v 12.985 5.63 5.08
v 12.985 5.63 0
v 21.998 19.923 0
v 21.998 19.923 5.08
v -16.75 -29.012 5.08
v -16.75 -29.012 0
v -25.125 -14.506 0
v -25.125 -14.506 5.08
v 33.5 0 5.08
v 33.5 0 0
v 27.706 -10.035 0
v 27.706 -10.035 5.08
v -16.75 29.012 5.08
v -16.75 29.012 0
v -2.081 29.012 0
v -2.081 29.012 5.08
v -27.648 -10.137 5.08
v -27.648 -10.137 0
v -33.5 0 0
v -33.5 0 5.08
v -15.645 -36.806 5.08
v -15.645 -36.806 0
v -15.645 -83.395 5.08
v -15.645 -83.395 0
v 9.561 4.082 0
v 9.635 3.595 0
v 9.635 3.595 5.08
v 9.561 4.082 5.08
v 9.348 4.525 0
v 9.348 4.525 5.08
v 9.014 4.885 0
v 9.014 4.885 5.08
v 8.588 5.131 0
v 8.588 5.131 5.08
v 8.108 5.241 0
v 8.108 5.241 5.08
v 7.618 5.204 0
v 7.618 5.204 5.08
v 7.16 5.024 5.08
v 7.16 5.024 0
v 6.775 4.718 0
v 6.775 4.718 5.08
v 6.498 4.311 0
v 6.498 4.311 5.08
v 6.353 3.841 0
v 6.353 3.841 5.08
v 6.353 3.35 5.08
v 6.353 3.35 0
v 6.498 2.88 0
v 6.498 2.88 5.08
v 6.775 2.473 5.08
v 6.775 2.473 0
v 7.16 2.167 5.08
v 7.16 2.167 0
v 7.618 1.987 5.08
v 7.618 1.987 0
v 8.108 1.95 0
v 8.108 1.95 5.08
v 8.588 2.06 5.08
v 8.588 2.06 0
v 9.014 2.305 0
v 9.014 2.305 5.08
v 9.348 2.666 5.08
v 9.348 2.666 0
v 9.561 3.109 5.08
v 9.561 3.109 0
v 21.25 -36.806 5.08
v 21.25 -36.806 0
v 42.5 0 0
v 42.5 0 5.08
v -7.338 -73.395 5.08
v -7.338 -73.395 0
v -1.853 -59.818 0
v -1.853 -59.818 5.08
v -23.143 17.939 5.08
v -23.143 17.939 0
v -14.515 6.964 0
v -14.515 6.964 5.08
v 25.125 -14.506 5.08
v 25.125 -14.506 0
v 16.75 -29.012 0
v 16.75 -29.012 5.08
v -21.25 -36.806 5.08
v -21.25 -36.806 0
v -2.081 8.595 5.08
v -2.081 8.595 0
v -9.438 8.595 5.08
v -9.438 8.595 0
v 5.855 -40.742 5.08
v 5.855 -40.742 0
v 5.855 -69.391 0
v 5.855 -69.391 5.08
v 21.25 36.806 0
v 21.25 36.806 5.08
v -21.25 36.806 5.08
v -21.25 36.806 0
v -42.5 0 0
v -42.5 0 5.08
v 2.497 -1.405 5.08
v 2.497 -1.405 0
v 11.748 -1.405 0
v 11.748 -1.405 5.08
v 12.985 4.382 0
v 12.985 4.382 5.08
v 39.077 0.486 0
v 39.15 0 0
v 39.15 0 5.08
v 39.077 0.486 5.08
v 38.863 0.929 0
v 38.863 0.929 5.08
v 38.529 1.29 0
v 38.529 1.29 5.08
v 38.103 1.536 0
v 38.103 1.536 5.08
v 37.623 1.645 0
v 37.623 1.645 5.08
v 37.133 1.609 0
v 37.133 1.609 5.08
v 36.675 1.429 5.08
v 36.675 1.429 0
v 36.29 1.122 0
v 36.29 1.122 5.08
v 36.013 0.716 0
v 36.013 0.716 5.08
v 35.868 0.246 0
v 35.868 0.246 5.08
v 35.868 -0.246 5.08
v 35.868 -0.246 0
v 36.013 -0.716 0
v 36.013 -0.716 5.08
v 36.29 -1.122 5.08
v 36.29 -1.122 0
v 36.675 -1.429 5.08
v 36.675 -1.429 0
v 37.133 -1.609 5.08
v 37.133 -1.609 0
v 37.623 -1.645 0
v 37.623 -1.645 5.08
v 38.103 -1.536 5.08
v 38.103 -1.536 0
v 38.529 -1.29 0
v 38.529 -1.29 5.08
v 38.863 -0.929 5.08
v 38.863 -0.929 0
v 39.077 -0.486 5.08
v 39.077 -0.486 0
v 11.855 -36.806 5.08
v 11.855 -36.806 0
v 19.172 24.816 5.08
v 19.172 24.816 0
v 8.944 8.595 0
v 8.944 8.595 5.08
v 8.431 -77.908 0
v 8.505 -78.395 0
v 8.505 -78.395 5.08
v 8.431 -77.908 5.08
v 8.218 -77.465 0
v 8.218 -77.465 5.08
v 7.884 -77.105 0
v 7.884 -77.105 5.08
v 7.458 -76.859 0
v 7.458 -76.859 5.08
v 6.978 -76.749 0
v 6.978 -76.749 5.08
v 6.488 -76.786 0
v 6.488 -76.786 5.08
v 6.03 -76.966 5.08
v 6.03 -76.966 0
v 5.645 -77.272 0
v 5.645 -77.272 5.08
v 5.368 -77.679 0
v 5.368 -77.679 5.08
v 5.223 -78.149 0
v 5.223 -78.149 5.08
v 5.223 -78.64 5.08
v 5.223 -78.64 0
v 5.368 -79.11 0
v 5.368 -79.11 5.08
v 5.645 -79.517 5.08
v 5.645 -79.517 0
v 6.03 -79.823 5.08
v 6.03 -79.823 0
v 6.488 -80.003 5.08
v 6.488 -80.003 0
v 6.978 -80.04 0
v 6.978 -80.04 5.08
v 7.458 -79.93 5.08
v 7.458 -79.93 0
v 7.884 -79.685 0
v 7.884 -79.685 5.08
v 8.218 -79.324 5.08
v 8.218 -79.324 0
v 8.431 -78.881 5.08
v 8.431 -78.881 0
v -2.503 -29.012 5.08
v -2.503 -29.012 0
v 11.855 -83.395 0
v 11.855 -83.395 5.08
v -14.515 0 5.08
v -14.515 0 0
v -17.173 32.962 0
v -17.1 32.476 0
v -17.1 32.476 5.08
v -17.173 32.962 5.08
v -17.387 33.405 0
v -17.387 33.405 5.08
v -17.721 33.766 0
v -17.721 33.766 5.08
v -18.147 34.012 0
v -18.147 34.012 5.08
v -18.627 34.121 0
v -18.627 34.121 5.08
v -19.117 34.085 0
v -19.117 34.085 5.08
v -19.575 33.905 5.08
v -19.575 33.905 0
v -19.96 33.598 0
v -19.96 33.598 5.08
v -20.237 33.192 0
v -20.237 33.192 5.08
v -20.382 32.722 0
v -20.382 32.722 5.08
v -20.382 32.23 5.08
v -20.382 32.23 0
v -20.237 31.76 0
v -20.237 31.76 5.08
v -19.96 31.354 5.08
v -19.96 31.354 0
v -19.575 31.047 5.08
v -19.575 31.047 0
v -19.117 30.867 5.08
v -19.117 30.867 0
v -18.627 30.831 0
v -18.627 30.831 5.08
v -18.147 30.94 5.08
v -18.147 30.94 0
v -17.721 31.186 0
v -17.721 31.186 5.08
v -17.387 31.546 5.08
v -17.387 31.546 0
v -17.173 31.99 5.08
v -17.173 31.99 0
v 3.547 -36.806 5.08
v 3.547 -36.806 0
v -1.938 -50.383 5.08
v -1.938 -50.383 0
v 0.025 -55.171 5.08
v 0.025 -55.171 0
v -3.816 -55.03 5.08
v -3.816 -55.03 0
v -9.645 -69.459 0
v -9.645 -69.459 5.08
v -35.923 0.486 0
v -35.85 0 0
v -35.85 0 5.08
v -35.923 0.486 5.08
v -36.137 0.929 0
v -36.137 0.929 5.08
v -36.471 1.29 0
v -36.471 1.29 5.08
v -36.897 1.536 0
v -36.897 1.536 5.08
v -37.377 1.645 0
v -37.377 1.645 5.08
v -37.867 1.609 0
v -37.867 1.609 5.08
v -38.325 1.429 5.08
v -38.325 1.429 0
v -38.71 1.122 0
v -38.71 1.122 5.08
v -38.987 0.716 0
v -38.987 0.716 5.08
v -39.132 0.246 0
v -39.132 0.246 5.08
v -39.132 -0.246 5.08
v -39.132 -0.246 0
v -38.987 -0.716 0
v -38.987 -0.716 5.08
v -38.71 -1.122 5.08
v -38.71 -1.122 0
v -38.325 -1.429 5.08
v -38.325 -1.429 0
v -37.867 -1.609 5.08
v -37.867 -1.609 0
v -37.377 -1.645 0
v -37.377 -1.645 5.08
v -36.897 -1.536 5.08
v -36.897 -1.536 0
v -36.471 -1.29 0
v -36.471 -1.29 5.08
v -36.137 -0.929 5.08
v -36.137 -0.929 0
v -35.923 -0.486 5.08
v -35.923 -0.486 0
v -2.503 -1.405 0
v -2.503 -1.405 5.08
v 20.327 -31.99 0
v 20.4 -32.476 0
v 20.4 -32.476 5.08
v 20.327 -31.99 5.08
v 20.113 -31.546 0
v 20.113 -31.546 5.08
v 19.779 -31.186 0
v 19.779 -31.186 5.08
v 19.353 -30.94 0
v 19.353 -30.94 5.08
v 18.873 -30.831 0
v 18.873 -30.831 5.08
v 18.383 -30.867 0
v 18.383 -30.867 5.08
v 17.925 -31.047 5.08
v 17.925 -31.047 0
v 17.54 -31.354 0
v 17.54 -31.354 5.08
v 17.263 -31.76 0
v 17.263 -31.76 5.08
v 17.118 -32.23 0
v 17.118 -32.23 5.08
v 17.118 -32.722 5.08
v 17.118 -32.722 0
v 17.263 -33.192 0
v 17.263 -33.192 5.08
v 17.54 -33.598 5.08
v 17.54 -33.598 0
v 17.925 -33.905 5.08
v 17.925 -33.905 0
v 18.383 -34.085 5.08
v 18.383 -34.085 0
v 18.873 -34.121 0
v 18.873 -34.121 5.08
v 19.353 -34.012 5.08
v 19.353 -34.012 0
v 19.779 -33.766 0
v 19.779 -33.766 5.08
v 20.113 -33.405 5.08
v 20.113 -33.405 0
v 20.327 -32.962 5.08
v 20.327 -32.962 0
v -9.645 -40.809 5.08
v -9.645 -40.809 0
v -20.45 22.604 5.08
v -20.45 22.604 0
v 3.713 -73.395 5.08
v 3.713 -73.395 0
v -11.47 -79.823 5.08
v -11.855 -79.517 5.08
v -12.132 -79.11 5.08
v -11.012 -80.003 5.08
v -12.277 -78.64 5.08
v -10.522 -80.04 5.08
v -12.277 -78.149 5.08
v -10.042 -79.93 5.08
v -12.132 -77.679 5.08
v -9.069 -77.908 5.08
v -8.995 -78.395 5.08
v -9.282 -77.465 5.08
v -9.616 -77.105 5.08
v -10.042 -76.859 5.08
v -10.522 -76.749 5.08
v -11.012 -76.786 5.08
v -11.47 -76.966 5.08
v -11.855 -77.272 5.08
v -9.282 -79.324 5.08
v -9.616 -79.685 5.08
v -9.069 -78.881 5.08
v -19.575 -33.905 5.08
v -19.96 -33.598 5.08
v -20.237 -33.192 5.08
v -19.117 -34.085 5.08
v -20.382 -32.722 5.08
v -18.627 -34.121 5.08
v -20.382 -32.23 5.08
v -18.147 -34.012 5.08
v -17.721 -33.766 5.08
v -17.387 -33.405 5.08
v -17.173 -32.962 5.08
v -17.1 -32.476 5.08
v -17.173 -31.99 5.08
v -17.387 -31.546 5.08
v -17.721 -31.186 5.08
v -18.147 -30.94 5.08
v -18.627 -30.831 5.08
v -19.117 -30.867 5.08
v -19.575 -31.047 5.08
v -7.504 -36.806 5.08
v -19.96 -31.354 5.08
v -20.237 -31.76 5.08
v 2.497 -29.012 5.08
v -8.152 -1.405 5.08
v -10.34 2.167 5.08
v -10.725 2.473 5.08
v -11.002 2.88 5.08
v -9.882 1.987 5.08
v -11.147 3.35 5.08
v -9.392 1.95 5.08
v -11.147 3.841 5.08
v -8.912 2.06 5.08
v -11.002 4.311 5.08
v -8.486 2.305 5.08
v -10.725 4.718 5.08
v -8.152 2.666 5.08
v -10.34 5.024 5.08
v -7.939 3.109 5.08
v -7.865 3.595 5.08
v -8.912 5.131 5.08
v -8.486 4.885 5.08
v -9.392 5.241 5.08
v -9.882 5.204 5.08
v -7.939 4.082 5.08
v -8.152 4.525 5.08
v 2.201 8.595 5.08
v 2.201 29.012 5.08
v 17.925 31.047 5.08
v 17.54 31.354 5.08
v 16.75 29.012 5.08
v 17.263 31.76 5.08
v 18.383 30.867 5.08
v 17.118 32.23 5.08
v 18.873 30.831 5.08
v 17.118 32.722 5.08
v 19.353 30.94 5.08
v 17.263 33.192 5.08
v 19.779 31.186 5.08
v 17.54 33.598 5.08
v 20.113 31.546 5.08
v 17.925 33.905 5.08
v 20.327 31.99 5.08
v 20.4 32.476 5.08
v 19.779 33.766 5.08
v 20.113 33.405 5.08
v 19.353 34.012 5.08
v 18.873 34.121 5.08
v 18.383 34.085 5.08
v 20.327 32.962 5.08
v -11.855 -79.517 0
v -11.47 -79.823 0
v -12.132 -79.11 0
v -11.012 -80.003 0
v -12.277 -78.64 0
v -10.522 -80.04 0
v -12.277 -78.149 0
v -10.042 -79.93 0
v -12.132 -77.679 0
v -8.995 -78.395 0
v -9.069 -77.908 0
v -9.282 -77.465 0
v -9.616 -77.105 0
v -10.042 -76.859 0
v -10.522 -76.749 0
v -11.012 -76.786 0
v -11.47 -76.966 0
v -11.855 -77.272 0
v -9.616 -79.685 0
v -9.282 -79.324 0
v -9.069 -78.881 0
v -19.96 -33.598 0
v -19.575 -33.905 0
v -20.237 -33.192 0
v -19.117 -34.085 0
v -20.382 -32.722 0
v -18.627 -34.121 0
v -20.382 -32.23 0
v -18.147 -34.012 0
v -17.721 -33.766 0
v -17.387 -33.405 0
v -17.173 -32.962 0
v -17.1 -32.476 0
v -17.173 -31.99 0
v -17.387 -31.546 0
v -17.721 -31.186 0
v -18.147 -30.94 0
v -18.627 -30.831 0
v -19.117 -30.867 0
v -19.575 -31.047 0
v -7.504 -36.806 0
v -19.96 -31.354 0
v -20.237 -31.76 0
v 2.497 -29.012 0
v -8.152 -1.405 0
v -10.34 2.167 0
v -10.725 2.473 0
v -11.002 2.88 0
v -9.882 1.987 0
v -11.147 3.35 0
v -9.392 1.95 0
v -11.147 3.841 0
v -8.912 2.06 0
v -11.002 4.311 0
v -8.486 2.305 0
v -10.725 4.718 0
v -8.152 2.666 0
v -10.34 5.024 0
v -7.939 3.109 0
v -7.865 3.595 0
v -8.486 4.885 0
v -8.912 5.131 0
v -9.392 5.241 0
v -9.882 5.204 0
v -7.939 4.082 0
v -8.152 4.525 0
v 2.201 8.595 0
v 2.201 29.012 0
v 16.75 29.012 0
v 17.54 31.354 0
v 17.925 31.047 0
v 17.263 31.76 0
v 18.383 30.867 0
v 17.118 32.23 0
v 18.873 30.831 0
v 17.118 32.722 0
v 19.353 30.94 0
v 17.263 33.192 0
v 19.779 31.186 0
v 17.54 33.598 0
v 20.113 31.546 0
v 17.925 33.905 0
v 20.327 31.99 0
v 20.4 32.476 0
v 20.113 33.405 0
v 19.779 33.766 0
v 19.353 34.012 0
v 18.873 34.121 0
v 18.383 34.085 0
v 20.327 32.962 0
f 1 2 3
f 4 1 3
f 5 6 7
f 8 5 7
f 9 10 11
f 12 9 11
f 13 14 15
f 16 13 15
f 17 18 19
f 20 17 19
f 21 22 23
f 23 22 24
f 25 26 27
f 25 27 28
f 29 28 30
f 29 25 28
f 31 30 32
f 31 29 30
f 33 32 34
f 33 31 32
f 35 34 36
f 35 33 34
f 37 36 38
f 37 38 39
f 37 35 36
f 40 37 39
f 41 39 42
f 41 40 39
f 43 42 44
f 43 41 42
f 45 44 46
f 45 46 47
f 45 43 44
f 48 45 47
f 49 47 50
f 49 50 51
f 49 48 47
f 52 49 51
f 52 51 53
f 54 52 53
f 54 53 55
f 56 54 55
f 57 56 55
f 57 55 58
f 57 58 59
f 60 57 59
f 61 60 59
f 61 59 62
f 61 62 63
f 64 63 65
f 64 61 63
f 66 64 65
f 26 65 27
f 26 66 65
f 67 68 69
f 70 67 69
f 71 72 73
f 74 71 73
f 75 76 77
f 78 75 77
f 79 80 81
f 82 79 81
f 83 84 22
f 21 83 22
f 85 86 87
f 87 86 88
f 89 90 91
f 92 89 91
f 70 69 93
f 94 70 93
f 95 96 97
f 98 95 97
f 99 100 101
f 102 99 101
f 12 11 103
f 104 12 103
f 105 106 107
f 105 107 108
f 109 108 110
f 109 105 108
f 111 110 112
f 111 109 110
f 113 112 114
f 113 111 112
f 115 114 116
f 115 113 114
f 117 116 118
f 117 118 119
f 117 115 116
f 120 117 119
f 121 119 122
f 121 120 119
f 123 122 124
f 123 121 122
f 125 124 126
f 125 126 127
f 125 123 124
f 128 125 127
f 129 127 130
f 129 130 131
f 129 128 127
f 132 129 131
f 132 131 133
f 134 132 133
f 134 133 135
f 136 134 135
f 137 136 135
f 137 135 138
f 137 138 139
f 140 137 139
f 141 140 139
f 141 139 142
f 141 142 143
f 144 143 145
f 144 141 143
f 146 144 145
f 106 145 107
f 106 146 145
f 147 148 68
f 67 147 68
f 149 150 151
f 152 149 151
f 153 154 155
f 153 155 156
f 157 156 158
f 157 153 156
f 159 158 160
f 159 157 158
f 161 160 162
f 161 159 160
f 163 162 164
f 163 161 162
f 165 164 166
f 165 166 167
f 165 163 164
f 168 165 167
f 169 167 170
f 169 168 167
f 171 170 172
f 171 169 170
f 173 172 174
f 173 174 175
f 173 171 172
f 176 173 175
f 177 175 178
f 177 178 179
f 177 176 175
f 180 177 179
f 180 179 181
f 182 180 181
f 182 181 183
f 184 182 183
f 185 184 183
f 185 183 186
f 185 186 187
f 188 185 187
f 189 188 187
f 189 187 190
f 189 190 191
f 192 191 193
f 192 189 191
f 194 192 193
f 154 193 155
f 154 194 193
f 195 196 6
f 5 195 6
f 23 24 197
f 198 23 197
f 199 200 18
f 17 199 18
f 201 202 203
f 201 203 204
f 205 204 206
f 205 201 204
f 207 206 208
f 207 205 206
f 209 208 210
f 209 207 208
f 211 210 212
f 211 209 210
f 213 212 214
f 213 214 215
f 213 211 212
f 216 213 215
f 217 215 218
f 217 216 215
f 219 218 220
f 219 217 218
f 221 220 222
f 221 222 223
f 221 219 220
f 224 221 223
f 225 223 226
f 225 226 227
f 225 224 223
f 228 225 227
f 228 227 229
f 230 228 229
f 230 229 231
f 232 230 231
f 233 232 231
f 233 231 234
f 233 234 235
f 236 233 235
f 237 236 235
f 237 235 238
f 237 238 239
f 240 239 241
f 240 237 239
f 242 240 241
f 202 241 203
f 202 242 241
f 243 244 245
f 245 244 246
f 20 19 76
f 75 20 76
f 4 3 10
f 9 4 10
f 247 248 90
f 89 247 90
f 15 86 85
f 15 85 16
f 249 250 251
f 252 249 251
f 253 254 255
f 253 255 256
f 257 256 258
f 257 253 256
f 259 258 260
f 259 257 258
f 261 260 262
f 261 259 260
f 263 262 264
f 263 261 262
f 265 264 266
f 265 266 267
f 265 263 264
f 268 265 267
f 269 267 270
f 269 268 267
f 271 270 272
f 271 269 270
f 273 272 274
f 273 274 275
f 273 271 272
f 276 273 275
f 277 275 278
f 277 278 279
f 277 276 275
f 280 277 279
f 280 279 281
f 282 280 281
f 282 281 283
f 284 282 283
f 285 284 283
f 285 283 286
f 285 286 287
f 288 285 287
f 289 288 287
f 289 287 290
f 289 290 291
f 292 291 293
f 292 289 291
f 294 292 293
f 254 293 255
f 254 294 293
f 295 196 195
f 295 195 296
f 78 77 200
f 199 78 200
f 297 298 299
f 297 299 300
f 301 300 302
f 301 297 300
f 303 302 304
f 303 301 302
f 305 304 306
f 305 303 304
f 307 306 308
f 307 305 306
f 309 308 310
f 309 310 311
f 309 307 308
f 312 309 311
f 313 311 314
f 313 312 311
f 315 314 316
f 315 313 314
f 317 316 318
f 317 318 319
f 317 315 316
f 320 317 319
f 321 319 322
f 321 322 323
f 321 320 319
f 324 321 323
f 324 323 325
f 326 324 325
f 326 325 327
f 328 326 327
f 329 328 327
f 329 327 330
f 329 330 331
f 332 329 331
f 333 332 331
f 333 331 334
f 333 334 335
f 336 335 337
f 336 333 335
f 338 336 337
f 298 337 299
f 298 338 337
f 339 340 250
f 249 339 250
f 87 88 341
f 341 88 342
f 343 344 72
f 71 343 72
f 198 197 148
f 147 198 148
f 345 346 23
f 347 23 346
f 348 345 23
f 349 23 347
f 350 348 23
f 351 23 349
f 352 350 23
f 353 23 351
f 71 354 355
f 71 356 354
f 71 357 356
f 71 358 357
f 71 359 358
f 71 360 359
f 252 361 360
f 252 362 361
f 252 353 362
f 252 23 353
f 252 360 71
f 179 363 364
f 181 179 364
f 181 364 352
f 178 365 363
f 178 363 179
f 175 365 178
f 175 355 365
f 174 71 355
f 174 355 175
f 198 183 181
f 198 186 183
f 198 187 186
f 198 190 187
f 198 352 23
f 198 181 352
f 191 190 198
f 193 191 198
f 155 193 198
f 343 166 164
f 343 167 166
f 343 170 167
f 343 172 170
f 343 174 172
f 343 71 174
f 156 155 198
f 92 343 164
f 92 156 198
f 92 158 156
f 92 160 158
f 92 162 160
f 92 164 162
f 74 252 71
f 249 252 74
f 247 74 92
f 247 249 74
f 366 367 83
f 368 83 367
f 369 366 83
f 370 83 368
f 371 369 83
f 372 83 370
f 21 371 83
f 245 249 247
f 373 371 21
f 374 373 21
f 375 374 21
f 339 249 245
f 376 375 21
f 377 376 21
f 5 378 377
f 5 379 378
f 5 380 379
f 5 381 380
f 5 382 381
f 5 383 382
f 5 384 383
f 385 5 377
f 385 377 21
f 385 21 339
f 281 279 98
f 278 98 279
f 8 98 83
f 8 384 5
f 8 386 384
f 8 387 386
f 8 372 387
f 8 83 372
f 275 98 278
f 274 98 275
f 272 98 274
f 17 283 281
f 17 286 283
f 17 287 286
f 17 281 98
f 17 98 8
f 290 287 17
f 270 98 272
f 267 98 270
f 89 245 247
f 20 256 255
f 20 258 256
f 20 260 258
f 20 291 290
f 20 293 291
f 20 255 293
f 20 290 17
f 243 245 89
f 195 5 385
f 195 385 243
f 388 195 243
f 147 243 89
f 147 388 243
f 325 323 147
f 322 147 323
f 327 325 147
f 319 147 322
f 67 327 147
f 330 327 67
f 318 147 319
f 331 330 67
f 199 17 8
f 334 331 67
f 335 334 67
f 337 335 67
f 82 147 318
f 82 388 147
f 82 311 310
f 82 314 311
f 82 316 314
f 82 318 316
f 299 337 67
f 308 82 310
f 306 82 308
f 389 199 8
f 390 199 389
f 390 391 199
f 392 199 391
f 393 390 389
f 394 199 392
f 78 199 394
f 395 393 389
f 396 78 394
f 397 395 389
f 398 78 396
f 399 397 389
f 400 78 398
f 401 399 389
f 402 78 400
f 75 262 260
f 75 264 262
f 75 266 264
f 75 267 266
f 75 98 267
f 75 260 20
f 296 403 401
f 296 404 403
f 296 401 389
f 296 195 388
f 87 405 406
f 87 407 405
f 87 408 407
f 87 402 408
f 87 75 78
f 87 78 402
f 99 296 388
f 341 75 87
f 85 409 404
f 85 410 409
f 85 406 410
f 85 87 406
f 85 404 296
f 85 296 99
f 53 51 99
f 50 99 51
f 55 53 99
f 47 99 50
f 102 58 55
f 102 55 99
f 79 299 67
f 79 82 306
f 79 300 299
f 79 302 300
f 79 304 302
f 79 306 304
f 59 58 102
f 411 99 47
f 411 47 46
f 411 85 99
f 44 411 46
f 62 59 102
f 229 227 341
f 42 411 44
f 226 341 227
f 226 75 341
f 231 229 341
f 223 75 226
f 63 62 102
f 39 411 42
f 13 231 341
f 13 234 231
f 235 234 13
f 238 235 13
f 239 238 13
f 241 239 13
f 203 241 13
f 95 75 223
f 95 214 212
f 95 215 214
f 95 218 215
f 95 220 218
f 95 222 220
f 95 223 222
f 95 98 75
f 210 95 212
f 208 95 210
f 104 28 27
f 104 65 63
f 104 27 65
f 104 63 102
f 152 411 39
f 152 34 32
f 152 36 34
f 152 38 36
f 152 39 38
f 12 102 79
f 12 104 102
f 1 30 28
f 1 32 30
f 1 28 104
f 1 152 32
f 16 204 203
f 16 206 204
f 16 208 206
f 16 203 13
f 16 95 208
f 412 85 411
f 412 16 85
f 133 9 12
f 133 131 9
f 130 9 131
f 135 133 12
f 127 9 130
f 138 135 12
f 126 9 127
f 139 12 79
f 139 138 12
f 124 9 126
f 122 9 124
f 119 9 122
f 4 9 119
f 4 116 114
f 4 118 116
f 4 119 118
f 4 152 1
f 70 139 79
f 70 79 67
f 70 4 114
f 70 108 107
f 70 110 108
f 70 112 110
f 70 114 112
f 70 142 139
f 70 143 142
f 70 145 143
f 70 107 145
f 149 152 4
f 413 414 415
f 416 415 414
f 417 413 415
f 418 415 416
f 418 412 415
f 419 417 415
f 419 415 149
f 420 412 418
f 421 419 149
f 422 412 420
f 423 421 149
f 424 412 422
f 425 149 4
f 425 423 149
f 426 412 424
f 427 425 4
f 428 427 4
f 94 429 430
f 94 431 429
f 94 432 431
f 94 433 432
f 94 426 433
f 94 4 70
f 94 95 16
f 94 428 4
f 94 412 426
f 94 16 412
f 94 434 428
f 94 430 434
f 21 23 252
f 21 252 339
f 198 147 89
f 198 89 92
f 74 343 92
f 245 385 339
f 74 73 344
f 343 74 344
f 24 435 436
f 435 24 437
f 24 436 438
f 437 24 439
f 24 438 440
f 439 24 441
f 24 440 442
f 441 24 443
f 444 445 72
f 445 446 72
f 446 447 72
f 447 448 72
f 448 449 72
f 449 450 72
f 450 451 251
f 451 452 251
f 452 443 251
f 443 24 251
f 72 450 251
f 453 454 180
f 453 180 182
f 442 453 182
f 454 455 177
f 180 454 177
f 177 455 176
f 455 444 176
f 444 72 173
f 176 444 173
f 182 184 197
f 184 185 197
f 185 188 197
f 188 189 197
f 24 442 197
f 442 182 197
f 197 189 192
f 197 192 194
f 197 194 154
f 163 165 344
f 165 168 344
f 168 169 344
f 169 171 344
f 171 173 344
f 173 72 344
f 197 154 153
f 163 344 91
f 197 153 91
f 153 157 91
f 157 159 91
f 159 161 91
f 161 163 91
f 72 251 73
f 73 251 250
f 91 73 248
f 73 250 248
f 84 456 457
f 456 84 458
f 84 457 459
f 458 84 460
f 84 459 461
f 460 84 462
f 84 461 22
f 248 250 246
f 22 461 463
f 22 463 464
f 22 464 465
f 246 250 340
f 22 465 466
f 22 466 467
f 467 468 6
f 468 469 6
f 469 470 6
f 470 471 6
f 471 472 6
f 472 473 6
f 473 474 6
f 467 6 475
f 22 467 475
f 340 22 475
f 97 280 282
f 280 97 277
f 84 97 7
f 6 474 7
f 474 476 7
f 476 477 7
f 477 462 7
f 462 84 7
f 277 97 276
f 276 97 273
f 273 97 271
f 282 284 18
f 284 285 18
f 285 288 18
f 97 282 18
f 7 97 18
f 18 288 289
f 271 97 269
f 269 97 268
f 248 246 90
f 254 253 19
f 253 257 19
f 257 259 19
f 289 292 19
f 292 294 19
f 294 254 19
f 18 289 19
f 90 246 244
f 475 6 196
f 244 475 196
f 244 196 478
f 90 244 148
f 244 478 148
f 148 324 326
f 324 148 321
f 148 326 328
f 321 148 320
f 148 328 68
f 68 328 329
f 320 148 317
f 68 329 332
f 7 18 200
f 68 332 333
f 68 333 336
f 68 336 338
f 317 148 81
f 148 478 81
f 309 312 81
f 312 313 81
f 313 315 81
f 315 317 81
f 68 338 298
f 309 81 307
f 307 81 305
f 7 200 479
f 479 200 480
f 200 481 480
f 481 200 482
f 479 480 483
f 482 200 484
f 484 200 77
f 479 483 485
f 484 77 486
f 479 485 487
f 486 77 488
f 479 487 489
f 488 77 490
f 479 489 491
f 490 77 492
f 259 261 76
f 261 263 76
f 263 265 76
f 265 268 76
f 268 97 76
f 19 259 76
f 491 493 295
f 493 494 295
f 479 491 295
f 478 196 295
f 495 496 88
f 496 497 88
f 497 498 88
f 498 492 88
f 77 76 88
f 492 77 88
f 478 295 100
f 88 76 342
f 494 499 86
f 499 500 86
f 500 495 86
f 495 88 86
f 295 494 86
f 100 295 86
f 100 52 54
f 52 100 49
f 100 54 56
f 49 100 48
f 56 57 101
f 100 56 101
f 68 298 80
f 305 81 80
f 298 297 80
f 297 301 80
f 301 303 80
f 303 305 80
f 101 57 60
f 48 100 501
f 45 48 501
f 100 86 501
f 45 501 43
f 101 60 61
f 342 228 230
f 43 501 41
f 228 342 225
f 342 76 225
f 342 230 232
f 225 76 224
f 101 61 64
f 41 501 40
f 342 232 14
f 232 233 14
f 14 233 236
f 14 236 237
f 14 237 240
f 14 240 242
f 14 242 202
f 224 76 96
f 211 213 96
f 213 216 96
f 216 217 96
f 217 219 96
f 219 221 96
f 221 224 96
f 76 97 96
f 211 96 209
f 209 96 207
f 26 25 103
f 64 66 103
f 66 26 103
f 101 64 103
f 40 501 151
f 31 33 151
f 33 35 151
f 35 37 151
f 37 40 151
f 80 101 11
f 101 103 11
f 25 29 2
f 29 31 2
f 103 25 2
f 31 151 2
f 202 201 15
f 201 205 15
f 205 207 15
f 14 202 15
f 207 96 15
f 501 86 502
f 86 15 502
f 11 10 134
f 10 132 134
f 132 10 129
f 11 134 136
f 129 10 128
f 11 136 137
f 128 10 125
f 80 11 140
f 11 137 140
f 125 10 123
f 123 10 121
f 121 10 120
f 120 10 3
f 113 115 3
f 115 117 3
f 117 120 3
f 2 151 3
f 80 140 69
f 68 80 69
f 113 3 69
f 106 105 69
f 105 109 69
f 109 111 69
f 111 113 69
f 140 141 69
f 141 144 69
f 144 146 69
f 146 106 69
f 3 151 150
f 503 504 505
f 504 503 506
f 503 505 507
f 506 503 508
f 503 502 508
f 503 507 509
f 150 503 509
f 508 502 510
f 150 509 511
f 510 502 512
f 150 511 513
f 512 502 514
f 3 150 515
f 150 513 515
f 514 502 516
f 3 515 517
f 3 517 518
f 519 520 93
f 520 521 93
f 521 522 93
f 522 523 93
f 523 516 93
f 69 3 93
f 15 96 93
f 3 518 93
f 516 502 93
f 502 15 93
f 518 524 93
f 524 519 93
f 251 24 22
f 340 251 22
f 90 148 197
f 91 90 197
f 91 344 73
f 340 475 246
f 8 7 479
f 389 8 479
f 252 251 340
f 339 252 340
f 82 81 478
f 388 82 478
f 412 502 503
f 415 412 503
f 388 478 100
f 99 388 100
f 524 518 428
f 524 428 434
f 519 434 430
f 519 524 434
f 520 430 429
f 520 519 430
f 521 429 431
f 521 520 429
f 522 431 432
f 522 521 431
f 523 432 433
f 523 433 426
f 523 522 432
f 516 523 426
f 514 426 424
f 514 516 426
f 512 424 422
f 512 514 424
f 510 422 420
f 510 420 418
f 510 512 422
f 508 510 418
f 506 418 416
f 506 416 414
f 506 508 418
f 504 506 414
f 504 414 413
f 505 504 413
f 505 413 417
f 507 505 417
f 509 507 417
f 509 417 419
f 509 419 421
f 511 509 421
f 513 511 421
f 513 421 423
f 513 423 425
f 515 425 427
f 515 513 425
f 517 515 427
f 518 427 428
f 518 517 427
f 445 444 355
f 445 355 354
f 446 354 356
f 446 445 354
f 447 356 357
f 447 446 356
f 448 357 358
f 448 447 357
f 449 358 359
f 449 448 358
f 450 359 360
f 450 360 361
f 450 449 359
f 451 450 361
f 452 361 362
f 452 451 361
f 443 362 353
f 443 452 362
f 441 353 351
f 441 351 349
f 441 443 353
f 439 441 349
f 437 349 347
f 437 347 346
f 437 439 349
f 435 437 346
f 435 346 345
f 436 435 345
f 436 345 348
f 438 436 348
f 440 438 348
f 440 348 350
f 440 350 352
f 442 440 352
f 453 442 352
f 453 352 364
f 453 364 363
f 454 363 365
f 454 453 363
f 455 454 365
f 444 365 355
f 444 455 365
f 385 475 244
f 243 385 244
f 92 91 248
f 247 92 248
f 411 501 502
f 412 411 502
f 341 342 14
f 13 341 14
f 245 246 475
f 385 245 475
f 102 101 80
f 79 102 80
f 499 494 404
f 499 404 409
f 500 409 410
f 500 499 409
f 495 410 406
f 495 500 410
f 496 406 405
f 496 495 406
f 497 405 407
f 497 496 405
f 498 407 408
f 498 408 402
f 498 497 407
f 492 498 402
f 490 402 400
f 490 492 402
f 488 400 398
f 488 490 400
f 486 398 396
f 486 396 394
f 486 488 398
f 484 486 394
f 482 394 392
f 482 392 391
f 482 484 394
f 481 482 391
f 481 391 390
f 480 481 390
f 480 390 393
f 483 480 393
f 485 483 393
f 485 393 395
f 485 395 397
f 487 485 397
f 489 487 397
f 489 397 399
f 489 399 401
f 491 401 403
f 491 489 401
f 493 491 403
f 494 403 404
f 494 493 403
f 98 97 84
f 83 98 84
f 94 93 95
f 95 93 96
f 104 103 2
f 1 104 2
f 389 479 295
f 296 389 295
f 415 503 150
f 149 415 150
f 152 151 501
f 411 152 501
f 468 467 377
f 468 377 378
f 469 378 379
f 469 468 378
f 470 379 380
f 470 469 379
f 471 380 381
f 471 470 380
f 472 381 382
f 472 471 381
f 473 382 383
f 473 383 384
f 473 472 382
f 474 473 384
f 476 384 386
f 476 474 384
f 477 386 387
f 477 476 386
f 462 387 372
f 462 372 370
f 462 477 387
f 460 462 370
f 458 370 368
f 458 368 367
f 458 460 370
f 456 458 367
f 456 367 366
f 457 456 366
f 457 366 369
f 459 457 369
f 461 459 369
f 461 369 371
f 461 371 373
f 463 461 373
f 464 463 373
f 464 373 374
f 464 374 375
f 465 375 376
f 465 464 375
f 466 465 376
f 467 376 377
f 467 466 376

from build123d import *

# Parameters (mm, degrees)
F0_R     = 1.65
F0_W     = 4.2823543772
F0_H     = 20.4163840114
F0_W_2   = 5
F0_H_2   = 27.6073180421
F1_DEPTH = 5.08


# Not quite as in the source:
# - a feature names something its author has since deleted; it is built from what else it names


with BuildPart() as f1:
    # F0 (on Top) → F1 (new body)
    with BuildSketch(Plane.XY):
        Polygon((21.25, 36.8060796608), (-21.25, 36.8060796608), (-42.5, 0), (-21.25, -36.8060796608), (-15.6452442706, -36.8060796608), (-9.6452442706, -36.8060796608), (-7.5036888061, -36.8060796608), (3.5473197586, -36.8060796608), (5.8547557294, -36.8060796608), (11.8547557294, -36.8060796608), (21.25, -36.8060796608), (42.5, 0), align=None)
        with Locations((-18.75, -32.4759526419)):
            Circle(F0_R, mode=Mode.SUBTRACT)
        with Locations((18.75, -32.4759526419)):
            Circle(F0_R, mode=Mode.SUBTRACT)
        with Locations((-37.5, 0)):
            Circle(F0_R, mode=Mode.SUBTRACT)
        with Locations((-18.75, 32.4759526419)):
            Circle(F0_R, mode=Mode.SUBTRACT)
        Polygon((-20.4496354018, 22.6038945413), (-16.75, 29.0118510268), (-2.0811383147, 29.0118510268), (2.2012160625, 29.0118510268), (16.75, 29.0118510268), (19.1722516141, 24.8163881624), (21.9975489559, 19.92282962), (33.5, 0), (27.7061208369, -10.0352930835), (25.125, -14.5059255134), (16.75, -29.0118510268), (2.497308068, -29.0118510268), (-2.502691932, -29.0118510268), (-16.75, -29.0118510268), (-25.125, -14.5059255134), (-27.6475357555, -10.1367654209), (-33.5, 0), (-23.1427541029, 17.9392761202), align=None, mode=Mode.SUBTRACT)
        with Locations((37.5, 0)):
            Circle(F0_R, mode=Mode.SUBTRACT)
        with Locations((18.75, 32.4759526419)):
            Circle(F0_R, mode=Mode.SUBTRACT)
        Polygon((2.2012160625, 8.5954670154), (-2.0811383147, 8.5954670154), (-9.4379286368, 8.5954670154), (-14.5152442706, 8.5954670154), (-14.5152442706, 6.9638797721), (-14.5152442706, 0), (-14.5152442706, -1.4045329846), (-8.1520013755, -1.4045329846), (-2.502691932, -1.4045329846), (2.497308068, -1.4045329846), (11.7475565604, -1.4045329846), (12.9847557294, -1.4045329846), (12.9847557294, 4.3822885496), (12.9847557294, 5.62991663), (12.9847557294, 8.5954670154), (8.9436992999, 8.5954670154), align=None)
        with Locations((-9.5152442706, 3.5954670154)):
            Circle(F0_R, mode=Mode.SUBTRACT)
        with Locations((7.9847557294, 3.5954670154)):
            Circle(F0_R, mode=Mode.SUBTRACT)
        Polygon((-9.6452442706, -36.8060796608), (-15.6452442706, -36.8060796608), (-15.6452442706, -73.3945329846), (-9.6452442706, -73.3945329846), (-9.6452442706, -69.4588214522), (-9.6452442706, -40.8093024077), align=None)
        Polygon((11.8547557294, -73.3945329846), (11.8547557294, -36.8060796608), (5.8547557294, -36.8060796608), (5.8547557294, -40.7417911932), (5.8547557294, -69.3913102377), (5.8547557294, -73.3945329846), align=None)
        Polygon((5.8547557294, -40.7417911932), (5.8547557294, -36.8060796608), (3.5473197586, -36.8060796608), (-1.9379455123, -50.3825876202), (0.0250296589, -55.1708695493), align=None)
        Polygon((-7.5036888061, -36.8060796608), (-9.6452442706, -36.8060796608), (-9.6452442706, -40.8093024077), (-3.8155182001, -55.0297430961), (-1.9379455123, -50.3825876202), align=None)
        Polygon((0.0250296589, -55.1708695493), (-1.9379455123, -50.3825876202), (-3.8155182001, -55.0297430961), (-1.8525430289, -59.8180250252), align=None)
        Polygon((-9.6452442706, -69.4588214522), (-9.6452442706, -73.3945329846), (-7.3378082997, -73.3945329846), (-1.8525430289, -59.8180250252), (-3.8155182001, -55.0297430961), align=None)
        Polygon((3.713200265, -73.3945329846), (5.8547557294, -73.3945329846), (5.8547557294, -69.3913102377), (0.0250296589, -55.1708695493), (-1.8525430289, -59.8180250252), align=None)
        Polygon((-9.6452442706, -73.3945329846), (-15.6452442706, -73.3945329846), (-15.6452442706, -83.3945329846), (11.8547557294, -83.3945329846), (11.8547557294, -73.3945329846), (5.8547557294, -73.3945329846), (3.713200265, -73.3945329846), (-7.3378082997, -73.3945329846), align=None)
        with Locations((-10.6452442706, -78.3945329846)):
            Circle(F0_R, mode=Mode.SUBTRACT)
        with Locations((6.8547557294, -78.3945329846)):
            Circle(F0_R, mode=Mode.SUBTRACT)
        Polygon((-9.4379286368, 8.5954670154), (-20.4496354018, 22.6038945413), (-23.1427541029, 17.9392761202), (-14.5152442706, 6.9638797721), (-14.5152442706, 8.5954670154), align=None)
        with Locations((0.0600388739, 18.8036590211)):
            Rectangle(F0_W, F0_H)
        Polygon((21.9975489559, 19.92282962), (19.1722516141, 24.8163881624), (8.9436992999, 8.5954670154), (12.9847557294, 8.5954670154), (12.9847557294, 5.62991663), align=None)
        Polygon((25.125, -14.5059255134), (27.7061208369, -10.0352930835), (12.9847557294, 4.3822885496), (12.9847557294, -1.4045329846), (11.7475565604, -1.4045329846), align=None)
        Polygon((-14.5152442706, 0), (-27.6475357555, -10.1367654209), (-25.125, -14.5059255134), (-8.1520013755, -1.4045329846), (-14.5152442706, -1.4045329846), align=None)
        with Locations((-0.002691932, -15.2081920057)):
            Rectangle(F0_W_2, F0_H_2)
    extrude(amount=F1_DEPTH)


solid = f1.part
